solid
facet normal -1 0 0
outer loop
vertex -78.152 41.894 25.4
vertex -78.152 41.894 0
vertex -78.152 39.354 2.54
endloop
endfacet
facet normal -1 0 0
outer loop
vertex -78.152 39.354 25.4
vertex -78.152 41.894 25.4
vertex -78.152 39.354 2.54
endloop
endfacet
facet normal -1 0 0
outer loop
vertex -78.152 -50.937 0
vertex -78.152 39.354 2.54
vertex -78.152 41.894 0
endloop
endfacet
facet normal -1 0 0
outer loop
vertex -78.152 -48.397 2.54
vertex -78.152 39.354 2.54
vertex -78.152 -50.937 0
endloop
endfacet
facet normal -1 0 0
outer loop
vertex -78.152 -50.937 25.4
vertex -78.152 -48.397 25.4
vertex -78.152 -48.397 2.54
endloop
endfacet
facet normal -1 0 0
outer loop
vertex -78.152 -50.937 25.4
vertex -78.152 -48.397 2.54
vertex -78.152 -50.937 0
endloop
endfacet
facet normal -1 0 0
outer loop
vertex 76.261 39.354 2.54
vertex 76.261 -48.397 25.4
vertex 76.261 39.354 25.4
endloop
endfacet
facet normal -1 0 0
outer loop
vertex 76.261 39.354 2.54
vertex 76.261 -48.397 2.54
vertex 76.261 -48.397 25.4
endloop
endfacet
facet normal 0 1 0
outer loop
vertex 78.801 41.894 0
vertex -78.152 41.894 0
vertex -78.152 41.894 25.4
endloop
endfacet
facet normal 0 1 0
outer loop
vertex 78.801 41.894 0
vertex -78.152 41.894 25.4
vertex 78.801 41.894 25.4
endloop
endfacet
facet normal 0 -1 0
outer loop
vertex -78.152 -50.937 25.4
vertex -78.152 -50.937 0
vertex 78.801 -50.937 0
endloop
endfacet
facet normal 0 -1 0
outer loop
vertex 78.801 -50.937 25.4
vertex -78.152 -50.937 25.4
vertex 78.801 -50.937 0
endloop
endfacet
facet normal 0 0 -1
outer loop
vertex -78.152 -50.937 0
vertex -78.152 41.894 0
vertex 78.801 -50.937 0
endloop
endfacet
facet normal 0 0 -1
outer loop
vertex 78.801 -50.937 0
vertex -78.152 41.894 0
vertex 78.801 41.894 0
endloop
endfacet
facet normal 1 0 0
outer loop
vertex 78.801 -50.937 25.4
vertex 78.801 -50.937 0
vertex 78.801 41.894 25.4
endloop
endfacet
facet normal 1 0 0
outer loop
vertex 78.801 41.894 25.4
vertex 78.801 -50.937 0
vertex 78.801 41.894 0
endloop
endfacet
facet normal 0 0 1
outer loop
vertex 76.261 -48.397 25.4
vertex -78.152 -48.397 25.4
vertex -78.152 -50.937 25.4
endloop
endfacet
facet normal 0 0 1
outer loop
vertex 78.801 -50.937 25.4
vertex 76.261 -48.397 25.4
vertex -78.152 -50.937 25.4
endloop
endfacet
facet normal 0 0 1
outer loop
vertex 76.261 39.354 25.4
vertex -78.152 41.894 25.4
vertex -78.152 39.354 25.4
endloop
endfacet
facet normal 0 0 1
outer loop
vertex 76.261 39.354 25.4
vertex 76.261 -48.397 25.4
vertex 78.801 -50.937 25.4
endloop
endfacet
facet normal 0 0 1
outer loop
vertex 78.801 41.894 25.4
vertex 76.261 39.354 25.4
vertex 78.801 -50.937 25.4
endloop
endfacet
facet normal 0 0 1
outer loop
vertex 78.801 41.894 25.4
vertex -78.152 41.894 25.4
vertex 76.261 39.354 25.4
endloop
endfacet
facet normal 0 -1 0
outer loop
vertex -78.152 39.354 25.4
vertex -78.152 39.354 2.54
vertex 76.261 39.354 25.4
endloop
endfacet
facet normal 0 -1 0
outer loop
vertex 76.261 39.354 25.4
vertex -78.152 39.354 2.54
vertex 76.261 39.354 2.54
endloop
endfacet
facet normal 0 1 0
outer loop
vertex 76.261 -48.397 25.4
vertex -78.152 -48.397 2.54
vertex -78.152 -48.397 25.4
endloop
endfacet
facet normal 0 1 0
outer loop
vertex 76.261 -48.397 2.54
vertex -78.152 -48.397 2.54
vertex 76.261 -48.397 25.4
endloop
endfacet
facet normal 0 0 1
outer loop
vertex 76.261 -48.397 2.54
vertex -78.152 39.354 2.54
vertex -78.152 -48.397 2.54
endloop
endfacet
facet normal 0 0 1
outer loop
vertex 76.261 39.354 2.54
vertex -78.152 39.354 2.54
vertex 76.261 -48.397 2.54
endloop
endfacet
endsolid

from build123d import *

# Parameters (mm, degrees)
F0_W      = 159.493204
F0_H      = 92.830694
F1_DEPTH  = 25.4
F2_T      = -2.54
F1_FACE_W = 92.830694
F1_FACE_H = 25.4
F3_DEPTH  = 2.54


with BuildPart() as f1:
    # F0 (on Top) → F1 (new body)
    with BuildSketch(Plane.XY):
        with Locations((-0.945693, -4.521475)):
            Rectangle(F0_W, F0_H)
    extrude(amount=F1_DEPTH)

    # F2
    f2_openings = [f1.faces().sort_by_distance(p)[0] for p in [
        (-0.945693, -4.521475, 25.4),
    ]]
    offset(amount=F2_T, openings=f2_openings)

    # F1_face (on face) → F3 (cut)
    with BuildSketch(Plane(origin=(-80.692295, -4.521475, 12.7), x_dir=(0, -1, 0), z_dir=(-1, 0, 0))):
        Rectangle(F1_FACE_W, F1_FACE_H)
    extrude(amount=-F3_DEPTH, mode=Mode.SUBTRACT)


solid = f1.part
